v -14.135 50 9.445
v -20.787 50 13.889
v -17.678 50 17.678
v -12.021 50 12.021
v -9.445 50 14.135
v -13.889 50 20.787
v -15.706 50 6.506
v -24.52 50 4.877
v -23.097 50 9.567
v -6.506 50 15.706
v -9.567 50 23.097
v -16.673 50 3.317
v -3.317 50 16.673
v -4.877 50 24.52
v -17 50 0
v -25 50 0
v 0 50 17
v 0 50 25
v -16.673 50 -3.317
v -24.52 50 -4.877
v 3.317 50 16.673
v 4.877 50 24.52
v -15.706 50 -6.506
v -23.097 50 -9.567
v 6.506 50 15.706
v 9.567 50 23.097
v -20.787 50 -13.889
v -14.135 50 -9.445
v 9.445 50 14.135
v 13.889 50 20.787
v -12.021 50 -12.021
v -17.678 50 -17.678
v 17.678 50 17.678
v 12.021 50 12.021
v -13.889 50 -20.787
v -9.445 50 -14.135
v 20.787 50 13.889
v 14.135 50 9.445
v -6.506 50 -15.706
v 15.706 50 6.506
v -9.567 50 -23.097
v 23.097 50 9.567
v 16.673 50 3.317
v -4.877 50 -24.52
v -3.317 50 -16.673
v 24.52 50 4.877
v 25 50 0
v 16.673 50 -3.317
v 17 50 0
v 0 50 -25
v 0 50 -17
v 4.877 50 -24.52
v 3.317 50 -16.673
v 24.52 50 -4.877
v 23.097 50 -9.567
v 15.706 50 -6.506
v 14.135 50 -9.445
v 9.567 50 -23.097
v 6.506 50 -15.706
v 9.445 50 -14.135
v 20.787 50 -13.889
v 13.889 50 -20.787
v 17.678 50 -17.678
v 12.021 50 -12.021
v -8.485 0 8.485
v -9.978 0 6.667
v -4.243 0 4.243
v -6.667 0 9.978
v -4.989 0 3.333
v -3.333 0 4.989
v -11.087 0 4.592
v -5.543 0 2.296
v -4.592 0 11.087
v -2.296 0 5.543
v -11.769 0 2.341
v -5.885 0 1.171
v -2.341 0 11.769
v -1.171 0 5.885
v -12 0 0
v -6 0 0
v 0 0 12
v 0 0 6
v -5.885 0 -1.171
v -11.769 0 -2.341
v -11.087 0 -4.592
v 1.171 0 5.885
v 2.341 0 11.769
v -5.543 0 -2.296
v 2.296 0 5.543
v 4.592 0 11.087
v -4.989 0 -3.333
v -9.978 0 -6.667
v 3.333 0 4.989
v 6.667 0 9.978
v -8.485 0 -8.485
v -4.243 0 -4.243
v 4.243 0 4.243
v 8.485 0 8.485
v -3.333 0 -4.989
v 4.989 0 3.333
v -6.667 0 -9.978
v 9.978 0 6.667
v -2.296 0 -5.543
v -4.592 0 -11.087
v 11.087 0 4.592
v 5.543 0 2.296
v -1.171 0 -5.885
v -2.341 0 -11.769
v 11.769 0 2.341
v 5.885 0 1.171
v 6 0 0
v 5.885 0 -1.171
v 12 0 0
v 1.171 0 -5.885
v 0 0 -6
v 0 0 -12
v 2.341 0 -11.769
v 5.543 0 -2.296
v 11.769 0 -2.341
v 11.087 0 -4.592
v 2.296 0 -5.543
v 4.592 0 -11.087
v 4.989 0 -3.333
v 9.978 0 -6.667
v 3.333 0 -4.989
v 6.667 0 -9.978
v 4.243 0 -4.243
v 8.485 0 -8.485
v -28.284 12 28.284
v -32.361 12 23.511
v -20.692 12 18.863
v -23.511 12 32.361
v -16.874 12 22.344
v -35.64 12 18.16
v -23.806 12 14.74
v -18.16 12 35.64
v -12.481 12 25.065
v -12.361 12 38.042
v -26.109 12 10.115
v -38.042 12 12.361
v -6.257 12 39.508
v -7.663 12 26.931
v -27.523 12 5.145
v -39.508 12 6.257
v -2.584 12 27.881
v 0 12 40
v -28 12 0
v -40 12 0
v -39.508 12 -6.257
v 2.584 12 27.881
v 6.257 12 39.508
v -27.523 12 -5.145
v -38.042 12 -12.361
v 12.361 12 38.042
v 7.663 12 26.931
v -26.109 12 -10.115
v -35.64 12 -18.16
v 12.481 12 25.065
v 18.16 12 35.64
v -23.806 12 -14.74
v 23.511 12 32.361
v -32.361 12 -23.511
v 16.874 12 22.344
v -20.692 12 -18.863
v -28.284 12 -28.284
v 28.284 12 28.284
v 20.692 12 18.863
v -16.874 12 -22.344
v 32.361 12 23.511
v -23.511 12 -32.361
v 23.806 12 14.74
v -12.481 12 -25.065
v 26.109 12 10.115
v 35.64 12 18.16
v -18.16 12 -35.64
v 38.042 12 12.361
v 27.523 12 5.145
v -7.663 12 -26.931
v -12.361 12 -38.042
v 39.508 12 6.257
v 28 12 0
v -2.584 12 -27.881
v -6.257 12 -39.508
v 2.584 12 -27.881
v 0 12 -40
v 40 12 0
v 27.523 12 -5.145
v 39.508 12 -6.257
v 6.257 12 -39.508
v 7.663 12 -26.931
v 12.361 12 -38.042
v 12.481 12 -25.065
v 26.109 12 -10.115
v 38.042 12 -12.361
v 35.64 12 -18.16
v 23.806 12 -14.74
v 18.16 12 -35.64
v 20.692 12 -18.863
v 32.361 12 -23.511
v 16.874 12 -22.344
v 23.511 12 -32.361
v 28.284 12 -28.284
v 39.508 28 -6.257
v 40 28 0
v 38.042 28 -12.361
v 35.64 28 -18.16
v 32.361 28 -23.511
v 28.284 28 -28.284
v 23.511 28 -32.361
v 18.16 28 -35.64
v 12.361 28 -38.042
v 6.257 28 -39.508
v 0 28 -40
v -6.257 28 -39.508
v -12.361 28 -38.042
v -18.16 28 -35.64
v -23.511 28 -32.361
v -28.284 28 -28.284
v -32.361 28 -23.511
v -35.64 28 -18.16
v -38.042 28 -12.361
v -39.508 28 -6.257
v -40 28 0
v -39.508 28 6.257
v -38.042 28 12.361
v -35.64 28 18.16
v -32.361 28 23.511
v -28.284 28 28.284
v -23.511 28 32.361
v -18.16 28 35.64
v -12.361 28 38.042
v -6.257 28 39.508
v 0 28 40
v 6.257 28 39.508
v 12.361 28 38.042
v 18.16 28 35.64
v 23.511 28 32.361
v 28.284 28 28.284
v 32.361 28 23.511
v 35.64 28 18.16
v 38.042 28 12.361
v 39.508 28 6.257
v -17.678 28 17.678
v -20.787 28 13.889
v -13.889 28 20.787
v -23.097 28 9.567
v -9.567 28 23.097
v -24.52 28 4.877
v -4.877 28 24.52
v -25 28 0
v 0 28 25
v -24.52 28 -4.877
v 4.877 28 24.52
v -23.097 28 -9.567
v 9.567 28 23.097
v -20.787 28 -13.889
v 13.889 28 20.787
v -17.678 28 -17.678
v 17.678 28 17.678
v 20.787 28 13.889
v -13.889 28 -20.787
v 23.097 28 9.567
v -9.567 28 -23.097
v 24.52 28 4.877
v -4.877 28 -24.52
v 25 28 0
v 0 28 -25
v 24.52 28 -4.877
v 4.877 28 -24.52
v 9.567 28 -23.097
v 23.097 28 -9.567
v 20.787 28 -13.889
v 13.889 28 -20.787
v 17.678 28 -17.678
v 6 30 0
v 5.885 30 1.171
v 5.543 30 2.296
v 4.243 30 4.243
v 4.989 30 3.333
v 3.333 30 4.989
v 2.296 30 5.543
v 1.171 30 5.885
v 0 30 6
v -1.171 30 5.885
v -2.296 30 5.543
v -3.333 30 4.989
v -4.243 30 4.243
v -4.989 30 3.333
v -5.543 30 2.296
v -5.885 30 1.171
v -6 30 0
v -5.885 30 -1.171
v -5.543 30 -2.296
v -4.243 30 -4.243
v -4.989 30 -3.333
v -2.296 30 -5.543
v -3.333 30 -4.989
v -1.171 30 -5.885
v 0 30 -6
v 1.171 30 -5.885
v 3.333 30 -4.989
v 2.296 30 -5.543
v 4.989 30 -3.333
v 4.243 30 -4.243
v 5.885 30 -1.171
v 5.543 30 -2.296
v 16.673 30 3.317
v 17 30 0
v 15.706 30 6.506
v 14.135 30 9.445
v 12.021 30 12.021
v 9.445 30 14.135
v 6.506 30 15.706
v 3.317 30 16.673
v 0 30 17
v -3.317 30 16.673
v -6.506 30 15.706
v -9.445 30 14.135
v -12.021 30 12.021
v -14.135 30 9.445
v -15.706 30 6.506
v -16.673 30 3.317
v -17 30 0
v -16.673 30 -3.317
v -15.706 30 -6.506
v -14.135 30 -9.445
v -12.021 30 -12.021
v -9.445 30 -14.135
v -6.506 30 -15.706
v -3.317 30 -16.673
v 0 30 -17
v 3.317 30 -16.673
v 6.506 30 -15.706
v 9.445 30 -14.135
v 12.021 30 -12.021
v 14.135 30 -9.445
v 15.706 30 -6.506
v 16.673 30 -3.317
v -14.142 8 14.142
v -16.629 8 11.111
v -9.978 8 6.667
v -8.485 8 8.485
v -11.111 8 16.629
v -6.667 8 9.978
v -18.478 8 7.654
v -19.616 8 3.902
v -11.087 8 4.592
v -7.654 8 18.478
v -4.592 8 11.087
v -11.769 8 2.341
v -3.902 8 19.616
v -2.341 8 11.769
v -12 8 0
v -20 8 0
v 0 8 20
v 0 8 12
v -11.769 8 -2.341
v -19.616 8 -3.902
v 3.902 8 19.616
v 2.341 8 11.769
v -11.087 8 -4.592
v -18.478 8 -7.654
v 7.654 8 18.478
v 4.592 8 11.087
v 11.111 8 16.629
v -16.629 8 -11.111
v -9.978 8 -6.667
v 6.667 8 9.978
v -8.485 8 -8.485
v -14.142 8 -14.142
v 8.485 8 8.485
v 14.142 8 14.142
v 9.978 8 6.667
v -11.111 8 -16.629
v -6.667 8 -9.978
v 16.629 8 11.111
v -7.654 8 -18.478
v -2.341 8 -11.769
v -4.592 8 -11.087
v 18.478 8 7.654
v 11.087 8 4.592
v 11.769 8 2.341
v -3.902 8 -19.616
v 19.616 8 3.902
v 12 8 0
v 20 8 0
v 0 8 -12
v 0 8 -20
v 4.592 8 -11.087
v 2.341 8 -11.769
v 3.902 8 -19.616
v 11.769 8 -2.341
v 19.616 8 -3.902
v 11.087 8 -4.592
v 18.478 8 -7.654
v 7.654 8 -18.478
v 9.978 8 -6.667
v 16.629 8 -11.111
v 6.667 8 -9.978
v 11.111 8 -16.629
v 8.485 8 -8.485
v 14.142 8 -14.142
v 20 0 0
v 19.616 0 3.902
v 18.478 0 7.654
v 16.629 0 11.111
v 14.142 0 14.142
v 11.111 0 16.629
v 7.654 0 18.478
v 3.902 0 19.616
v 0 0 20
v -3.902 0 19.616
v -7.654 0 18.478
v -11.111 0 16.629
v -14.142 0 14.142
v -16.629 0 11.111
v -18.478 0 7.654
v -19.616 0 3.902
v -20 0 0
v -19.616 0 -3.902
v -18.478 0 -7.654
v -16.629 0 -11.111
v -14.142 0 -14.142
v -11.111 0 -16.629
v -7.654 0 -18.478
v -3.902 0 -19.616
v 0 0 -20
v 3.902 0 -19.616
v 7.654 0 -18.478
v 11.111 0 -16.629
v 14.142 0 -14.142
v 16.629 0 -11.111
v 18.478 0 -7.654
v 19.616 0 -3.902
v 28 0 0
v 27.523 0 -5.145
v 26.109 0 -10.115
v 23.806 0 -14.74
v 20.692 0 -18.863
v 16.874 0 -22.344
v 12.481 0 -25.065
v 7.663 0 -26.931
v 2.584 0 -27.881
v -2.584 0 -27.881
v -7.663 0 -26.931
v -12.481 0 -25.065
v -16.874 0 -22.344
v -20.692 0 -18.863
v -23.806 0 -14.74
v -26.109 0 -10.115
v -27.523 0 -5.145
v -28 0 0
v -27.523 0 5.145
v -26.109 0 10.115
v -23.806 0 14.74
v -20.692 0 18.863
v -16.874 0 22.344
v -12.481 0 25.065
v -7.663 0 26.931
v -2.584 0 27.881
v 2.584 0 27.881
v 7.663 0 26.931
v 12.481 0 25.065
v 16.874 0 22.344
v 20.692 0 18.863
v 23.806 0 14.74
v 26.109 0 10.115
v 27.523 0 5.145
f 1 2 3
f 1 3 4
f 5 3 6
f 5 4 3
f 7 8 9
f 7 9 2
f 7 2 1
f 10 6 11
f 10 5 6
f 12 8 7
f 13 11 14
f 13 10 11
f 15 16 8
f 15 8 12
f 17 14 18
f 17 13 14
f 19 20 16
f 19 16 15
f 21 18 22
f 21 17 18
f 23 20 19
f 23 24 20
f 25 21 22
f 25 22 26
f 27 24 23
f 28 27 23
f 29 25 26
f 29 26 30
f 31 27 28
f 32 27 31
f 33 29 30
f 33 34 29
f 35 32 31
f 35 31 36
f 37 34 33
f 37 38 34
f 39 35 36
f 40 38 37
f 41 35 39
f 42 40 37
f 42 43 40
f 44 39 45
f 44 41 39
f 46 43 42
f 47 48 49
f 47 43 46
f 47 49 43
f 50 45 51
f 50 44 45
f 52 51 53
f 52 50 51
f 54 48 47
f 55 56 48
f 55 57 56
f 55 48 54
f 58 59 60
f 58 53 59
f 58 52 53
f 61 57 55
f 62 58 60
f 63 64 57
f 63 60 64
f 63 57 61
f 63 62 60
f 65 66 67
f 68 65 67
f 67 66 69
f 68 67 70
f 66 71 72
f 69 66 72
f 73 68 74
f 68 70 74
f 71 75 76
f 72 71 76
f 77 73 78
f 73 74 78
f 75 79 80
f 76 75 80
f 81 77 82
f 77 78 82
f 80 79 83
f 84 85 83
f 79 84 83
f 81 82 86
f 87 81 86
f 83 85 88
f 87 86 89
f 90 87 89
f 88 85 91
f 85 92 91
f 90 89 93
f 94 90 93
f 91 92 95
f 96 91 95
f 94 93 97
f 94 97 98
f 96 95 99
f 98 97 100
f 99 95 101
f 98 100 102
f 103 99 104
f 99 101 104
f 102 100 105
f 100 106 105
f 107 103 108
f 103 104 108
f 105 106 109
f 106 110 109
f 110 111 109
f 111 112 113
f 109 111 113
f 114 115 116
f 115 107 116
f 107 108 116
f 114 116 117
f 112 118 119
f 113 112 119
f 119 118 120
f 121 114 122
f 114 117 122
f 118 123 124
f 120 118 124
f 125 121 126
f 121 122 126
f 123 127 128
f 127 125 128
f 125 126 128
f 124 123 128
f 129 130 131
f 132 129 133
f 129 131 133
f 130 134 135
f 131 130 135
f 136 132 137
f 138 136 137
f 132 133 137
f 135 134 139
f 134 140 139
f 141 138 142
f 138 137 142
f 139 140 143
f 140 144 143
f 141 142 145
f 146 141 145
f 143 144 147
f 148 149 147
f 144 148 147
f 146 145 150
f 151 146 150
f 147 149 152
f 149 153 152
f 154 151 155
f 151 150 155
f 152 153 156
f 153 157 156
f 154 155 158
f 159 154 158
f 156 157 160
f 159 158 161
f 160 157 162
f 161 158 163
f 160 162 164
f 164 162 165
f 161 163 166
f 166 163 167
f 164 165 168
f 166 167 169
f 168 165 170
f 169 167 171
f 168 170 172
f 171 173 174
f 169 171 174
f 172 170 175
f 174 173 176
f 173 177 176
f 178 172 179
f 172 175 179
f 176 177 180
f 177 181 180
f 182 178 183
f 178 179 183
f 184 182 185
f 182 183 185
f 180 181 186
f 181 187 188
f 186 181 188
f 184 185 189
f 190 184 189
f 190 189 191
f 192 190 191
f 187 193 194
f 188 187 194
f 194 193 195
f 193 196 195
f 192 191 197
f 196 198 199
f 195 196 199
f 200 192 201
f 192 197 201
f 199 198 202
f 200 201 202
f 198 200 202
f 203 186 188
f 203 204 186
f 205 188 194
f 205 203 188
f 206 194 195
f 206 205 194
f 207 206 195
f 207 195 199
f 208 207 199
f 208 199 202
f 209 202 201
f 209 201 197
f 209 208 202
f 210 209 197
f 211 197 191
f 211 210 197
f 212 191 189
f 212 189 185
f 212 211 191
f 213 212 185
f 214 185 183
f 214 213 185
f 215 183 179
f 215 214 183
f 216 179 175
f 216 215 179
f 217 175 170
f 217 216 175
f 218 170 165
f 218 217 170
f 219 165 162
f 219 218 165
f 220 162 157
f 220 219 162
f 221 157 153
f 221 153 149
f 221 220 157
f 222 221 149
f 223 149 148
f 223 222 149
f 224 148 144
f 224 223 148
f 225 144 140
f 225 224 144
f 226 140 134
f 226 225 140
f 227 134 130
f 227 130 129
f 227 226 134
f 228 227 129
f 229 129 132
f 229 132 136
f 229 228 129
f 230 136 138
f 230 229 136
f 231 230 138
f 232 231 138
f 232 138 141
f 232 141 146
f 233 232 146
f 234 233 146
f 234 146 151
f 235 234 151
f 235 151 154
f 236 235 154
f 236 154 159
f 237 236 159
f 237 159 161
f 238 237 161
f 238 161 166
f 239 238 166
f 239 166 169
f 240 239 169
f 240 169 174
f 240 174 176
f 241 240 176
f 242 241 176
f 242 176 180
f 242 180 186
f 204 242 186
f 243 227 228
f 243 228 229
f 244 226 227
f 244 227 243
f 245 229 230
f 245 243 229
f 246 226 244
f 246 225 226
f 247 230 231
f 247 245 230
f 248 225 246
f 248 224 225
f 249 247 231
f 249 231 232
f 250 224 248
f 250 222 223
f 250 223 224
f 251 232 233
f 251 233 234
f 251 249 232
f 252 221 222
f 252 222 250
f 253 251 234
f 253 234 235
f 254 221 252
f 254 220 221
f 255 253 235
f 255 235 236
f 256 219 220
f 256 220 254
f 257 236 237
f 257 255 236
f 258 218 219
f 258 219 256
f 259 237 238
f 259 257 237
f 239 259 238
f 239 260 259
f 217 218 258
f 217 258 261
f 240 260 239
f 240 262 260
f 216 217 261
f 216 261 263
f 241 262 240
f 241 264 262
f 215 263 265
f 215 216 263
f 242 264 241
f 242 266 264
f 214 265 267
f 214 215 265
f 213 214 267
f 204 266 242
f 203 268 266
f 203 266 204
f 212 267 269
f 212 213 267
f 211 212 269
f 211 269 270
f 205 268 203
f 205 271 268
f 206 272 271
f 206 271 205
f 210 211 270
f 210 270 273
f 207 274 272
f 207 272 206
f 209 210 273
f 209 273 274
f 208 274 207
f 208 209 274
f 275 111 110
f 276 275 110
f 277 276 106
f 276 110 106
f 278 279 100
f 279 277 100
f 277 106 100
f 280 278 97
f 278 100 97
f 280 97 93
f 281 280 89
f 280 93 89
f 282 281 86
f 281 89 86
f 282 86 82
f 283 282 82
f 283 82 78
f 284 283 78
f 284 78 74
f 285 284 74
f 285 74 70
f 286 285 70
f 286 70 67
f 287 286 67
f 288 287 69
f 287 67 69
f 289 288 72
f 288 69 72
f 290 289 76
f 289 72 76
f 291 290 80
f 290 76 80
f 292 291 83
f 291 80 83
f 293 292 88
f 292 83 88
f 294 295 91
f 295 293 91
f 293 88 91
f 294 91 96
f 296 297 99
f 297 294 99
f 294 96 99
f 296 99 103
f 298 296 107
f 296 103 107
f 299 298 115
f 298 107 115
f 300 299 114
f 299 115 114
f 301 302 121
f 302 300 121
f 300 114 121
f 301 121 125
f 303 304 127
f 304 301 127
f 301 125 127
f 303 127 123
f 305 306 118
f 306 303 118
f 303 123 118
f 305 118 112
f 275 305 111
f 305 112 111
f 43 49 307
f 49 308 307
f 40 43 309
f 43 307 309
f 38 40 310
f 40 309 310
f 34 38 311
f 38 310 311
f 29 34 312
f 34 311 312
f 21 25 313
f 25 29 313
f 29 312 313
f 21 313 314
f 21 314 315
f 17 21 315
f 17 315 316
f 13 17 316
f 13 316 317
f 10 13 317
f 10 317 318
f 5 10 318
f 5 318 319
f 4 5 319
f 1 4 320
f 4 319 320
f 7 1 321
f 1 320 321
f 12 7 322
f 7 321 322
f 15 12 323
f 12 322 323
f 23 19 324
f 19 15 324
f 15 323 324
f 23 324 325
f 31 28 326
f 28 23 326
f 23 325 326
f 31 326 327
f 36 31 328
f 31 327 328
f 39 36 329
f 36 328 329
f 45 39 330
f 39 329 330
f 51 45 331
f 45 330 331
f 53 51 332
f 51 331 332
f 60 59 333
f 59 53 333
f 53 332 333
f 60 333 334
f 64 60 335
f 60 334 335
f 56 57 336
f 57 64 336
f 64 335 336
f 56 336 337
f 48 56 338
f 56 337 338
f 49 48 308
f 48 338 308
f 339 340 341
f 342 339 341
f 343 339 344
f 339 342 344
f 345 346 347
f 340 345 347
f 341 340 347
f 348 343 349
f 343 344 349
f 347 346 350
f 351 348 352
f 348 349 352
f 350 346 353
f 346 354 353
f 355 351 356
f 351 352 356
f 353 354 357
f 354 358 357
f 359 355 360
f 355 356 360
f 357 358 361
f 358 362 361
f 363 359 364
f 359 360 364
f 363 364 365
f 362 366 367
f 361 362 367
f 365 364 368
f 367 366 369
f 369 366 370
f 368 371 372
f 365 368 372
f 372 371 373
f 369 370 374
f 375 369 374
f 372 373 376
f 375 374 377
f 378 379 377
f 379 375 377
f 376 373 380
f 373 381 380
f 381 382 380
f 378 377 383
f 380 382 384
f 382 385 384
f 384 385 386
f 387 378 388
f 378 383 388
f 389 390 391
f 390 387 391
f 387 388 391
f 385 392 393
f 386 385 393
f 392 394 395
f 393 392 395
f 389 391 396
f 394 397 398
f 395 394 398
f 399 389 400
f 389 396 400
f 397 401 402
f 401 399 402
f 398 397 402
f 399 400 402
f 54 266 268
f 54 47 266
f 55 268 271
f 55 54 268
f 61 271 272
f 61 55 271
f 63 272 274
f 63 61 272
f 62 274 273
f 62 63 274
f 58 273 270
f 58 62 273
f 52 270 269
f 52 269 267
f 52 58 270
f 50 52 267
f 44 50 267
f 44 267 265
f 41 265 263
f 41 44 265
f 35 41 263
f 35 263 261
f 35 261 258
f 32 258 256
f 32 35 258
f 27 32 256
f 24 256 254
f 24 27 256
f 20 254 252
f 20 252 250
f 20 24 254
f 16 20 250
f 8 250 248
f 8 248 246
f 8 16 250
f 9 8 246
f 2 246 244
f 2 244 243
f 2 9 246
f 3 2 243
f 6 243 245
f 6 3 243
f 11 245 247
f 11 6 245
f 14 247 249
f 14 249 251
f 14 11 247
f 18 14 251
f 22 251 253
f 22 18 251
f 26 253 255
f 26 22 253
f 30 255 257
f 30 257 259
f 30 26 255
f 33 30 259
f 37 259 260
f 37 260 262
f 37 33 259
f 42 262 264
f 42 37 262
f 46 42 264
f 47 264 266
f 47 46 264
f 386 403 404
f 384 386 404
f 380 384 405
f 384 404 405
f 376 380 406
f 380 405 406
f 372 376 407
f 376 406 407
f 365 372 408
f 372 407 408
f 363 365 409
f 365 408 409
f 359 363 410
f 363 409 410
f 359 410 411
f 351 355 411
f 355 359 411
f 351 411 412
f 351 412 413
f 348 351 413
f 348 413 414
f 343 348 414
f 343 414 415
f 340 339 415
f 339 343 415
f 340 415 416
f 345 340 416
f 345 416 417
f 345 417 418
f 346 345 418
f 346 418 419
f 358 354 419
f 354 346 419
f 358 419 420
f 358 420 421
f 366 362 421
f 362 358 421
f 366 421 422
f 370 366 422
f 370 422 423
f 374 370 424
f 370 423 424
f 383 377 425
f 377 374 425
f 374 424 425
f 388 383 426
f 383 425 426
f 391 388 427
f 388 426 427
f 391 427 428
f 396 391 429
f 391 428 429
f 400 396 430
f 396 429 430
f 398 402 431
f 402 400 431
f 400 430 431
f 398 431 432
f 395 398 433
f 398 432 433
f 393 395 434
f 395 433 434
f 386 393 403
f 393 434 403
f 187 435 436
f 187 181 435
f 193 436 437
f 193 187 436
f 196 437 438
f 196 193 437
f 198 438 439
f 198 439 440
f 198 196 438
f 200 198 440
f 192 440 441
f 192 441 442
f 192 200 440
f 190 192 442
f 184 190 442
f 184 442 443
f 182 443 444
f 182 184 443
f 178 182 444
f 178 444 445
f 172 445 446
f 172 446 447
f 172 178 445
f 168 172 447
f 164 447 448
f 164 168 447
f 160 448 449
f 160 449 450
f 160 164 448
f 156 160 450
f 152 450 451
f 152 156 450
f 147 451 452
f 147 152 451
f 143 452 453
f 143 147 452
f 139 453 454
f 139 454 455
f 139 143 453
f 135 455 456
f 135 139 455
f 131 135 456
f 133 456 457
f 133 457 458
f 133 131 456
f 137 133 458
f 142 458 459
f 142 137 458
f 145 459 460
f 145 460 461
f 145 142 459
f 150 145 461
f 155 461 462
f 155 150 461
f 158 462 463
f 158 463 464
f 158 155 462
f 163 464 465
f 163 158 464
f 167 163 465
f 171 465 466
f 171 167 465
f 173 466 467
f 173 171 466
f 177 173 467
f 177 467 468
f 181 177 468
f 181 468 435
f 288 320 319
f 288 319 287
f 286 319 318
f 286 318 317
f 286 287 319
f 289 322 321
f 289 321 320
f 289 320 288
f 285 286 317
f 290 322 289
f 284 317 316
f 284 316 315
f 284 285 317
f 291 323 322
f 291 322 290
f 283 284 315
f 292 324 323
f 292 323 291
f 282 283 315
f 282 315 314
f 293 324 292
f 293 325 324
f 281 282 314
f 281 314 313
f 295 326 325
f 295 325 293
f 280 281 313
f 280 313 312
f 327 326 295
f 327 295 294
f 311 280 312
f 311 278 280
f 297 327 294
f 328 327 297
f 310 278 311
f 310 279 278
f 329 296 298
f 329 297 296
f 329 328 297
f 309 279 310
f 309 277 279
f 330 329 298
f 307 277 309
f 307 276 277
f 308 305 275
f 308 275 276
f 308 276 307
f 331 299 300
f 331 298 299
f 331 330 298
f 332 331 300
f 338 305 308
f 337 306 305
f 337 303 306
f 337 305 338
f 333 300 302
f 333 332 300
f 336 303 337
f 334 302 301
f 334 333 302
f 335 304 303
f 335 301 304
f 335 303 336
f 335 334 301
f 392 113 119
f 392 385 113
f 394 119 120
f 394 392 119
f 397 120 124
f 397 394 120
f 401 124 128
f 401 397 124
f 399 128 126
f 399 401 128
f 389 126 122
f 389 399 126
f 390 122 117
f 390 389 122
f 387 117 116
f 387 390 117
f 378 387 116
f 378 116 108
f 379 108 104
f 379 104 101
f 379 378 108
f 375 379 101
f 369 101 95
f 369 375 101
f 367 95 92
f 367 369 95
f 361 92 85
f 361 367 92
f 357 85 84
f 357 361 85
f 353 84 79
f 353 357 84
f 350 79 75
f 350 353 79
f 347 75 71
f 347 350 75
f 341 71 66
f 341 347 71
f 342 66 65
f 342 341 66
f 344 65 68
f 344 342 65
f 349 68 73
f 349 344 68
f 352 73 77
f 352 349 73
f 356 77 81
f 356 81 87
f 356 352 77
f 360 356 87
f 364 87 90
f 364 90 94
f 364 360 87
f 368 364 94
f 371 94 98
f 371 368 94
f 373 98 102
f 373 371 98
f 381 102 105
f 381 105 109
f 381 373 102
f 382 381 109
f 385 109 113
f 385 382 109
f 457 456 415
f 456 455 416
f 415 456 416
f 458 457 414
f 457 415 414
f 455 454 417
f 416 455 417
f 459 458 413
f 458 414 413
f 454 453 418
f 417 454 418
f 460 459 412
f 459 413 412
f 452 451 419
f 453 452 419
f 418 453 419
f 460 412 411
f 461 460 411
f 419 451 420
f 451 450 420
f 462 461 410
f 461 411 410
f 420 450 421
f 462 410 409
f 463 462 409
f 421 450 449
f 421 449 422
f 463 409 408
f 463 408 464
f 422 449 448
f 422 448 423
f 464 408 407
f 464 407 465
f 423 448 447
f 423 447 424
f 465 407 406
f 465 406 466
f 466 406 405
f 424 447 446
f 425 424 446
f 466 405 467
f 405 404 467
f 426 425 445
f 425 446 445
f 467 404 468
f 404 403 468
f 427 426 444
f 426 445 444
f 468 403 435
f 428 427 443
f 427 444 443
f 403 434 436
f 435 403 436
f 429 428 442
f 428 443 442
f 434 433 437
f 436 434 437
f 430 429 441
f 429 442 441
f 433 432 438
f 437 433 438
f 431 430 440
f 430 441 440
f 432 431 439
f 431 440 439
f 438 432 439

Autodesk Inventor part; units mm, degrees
ref_plane "YZ Plane" through (0, 0, 0) normal (1, 0, 0) x (0, 1, 0)
ref_plane "XZ Plane" through (0, 0, 0) normal (0, 1, 0) x (-1, 0, 0)
ref_plane "XY Plane" through (0, 0, 0) normal (0, 0, 1) x (1, 0, 0)
sketch "Эскиз1" plane through (0, 0, 0) normal (0, 0, 1) x (1, 0, 0)
  line L0 (6, 0) -> (12, 0)
  line L1 (12, 0) -> (12, 8)
  line L2 (12, 8) -> (20, 8)
  line L3 (20, 8) -> (20, 0)
  line L4 (20, 0) -> (28, 0)
  line L5 (28, 0) -> (28, 12)
  line L6 (28, 12) -> (40, 12)
  line L7 (40, 12) -> (40, 28)
  line L8 (40, 28) -> (25, 28)
  line L9 (25, 28) -> (25, 50)
  line L10 (25, 50) -> (17, 50)
  line L11 (17, 50) -> (17, 30)
  line L12 (17, 30) -> (6, 30)
  line L13 (6, 30) -> (6, 0)
  line L14 (6, 0) -> (0, 0)
  line L15 (0, 0) -> (0, 22.7372)
  dimension "d0" = 6
  dimension "d1" = 8
  dimension "d2" = 8
  dimension "d4" = 12
  dimension "d5" = 12
  dimension "d7" = 15
  dimension "d8" = 22
  dimension "d10" = 20
  dimension "d11" = 11
  dimension "d12" = 8
  dimension "d13" = 8
  dimension "d14" = 30
  dimension "d15" = 6
revolve "Вращение1" add sketch "Эскиз1" angle 360 about axis through (0, 0, 0) along (0, 1, 0)
properties part number "3"
